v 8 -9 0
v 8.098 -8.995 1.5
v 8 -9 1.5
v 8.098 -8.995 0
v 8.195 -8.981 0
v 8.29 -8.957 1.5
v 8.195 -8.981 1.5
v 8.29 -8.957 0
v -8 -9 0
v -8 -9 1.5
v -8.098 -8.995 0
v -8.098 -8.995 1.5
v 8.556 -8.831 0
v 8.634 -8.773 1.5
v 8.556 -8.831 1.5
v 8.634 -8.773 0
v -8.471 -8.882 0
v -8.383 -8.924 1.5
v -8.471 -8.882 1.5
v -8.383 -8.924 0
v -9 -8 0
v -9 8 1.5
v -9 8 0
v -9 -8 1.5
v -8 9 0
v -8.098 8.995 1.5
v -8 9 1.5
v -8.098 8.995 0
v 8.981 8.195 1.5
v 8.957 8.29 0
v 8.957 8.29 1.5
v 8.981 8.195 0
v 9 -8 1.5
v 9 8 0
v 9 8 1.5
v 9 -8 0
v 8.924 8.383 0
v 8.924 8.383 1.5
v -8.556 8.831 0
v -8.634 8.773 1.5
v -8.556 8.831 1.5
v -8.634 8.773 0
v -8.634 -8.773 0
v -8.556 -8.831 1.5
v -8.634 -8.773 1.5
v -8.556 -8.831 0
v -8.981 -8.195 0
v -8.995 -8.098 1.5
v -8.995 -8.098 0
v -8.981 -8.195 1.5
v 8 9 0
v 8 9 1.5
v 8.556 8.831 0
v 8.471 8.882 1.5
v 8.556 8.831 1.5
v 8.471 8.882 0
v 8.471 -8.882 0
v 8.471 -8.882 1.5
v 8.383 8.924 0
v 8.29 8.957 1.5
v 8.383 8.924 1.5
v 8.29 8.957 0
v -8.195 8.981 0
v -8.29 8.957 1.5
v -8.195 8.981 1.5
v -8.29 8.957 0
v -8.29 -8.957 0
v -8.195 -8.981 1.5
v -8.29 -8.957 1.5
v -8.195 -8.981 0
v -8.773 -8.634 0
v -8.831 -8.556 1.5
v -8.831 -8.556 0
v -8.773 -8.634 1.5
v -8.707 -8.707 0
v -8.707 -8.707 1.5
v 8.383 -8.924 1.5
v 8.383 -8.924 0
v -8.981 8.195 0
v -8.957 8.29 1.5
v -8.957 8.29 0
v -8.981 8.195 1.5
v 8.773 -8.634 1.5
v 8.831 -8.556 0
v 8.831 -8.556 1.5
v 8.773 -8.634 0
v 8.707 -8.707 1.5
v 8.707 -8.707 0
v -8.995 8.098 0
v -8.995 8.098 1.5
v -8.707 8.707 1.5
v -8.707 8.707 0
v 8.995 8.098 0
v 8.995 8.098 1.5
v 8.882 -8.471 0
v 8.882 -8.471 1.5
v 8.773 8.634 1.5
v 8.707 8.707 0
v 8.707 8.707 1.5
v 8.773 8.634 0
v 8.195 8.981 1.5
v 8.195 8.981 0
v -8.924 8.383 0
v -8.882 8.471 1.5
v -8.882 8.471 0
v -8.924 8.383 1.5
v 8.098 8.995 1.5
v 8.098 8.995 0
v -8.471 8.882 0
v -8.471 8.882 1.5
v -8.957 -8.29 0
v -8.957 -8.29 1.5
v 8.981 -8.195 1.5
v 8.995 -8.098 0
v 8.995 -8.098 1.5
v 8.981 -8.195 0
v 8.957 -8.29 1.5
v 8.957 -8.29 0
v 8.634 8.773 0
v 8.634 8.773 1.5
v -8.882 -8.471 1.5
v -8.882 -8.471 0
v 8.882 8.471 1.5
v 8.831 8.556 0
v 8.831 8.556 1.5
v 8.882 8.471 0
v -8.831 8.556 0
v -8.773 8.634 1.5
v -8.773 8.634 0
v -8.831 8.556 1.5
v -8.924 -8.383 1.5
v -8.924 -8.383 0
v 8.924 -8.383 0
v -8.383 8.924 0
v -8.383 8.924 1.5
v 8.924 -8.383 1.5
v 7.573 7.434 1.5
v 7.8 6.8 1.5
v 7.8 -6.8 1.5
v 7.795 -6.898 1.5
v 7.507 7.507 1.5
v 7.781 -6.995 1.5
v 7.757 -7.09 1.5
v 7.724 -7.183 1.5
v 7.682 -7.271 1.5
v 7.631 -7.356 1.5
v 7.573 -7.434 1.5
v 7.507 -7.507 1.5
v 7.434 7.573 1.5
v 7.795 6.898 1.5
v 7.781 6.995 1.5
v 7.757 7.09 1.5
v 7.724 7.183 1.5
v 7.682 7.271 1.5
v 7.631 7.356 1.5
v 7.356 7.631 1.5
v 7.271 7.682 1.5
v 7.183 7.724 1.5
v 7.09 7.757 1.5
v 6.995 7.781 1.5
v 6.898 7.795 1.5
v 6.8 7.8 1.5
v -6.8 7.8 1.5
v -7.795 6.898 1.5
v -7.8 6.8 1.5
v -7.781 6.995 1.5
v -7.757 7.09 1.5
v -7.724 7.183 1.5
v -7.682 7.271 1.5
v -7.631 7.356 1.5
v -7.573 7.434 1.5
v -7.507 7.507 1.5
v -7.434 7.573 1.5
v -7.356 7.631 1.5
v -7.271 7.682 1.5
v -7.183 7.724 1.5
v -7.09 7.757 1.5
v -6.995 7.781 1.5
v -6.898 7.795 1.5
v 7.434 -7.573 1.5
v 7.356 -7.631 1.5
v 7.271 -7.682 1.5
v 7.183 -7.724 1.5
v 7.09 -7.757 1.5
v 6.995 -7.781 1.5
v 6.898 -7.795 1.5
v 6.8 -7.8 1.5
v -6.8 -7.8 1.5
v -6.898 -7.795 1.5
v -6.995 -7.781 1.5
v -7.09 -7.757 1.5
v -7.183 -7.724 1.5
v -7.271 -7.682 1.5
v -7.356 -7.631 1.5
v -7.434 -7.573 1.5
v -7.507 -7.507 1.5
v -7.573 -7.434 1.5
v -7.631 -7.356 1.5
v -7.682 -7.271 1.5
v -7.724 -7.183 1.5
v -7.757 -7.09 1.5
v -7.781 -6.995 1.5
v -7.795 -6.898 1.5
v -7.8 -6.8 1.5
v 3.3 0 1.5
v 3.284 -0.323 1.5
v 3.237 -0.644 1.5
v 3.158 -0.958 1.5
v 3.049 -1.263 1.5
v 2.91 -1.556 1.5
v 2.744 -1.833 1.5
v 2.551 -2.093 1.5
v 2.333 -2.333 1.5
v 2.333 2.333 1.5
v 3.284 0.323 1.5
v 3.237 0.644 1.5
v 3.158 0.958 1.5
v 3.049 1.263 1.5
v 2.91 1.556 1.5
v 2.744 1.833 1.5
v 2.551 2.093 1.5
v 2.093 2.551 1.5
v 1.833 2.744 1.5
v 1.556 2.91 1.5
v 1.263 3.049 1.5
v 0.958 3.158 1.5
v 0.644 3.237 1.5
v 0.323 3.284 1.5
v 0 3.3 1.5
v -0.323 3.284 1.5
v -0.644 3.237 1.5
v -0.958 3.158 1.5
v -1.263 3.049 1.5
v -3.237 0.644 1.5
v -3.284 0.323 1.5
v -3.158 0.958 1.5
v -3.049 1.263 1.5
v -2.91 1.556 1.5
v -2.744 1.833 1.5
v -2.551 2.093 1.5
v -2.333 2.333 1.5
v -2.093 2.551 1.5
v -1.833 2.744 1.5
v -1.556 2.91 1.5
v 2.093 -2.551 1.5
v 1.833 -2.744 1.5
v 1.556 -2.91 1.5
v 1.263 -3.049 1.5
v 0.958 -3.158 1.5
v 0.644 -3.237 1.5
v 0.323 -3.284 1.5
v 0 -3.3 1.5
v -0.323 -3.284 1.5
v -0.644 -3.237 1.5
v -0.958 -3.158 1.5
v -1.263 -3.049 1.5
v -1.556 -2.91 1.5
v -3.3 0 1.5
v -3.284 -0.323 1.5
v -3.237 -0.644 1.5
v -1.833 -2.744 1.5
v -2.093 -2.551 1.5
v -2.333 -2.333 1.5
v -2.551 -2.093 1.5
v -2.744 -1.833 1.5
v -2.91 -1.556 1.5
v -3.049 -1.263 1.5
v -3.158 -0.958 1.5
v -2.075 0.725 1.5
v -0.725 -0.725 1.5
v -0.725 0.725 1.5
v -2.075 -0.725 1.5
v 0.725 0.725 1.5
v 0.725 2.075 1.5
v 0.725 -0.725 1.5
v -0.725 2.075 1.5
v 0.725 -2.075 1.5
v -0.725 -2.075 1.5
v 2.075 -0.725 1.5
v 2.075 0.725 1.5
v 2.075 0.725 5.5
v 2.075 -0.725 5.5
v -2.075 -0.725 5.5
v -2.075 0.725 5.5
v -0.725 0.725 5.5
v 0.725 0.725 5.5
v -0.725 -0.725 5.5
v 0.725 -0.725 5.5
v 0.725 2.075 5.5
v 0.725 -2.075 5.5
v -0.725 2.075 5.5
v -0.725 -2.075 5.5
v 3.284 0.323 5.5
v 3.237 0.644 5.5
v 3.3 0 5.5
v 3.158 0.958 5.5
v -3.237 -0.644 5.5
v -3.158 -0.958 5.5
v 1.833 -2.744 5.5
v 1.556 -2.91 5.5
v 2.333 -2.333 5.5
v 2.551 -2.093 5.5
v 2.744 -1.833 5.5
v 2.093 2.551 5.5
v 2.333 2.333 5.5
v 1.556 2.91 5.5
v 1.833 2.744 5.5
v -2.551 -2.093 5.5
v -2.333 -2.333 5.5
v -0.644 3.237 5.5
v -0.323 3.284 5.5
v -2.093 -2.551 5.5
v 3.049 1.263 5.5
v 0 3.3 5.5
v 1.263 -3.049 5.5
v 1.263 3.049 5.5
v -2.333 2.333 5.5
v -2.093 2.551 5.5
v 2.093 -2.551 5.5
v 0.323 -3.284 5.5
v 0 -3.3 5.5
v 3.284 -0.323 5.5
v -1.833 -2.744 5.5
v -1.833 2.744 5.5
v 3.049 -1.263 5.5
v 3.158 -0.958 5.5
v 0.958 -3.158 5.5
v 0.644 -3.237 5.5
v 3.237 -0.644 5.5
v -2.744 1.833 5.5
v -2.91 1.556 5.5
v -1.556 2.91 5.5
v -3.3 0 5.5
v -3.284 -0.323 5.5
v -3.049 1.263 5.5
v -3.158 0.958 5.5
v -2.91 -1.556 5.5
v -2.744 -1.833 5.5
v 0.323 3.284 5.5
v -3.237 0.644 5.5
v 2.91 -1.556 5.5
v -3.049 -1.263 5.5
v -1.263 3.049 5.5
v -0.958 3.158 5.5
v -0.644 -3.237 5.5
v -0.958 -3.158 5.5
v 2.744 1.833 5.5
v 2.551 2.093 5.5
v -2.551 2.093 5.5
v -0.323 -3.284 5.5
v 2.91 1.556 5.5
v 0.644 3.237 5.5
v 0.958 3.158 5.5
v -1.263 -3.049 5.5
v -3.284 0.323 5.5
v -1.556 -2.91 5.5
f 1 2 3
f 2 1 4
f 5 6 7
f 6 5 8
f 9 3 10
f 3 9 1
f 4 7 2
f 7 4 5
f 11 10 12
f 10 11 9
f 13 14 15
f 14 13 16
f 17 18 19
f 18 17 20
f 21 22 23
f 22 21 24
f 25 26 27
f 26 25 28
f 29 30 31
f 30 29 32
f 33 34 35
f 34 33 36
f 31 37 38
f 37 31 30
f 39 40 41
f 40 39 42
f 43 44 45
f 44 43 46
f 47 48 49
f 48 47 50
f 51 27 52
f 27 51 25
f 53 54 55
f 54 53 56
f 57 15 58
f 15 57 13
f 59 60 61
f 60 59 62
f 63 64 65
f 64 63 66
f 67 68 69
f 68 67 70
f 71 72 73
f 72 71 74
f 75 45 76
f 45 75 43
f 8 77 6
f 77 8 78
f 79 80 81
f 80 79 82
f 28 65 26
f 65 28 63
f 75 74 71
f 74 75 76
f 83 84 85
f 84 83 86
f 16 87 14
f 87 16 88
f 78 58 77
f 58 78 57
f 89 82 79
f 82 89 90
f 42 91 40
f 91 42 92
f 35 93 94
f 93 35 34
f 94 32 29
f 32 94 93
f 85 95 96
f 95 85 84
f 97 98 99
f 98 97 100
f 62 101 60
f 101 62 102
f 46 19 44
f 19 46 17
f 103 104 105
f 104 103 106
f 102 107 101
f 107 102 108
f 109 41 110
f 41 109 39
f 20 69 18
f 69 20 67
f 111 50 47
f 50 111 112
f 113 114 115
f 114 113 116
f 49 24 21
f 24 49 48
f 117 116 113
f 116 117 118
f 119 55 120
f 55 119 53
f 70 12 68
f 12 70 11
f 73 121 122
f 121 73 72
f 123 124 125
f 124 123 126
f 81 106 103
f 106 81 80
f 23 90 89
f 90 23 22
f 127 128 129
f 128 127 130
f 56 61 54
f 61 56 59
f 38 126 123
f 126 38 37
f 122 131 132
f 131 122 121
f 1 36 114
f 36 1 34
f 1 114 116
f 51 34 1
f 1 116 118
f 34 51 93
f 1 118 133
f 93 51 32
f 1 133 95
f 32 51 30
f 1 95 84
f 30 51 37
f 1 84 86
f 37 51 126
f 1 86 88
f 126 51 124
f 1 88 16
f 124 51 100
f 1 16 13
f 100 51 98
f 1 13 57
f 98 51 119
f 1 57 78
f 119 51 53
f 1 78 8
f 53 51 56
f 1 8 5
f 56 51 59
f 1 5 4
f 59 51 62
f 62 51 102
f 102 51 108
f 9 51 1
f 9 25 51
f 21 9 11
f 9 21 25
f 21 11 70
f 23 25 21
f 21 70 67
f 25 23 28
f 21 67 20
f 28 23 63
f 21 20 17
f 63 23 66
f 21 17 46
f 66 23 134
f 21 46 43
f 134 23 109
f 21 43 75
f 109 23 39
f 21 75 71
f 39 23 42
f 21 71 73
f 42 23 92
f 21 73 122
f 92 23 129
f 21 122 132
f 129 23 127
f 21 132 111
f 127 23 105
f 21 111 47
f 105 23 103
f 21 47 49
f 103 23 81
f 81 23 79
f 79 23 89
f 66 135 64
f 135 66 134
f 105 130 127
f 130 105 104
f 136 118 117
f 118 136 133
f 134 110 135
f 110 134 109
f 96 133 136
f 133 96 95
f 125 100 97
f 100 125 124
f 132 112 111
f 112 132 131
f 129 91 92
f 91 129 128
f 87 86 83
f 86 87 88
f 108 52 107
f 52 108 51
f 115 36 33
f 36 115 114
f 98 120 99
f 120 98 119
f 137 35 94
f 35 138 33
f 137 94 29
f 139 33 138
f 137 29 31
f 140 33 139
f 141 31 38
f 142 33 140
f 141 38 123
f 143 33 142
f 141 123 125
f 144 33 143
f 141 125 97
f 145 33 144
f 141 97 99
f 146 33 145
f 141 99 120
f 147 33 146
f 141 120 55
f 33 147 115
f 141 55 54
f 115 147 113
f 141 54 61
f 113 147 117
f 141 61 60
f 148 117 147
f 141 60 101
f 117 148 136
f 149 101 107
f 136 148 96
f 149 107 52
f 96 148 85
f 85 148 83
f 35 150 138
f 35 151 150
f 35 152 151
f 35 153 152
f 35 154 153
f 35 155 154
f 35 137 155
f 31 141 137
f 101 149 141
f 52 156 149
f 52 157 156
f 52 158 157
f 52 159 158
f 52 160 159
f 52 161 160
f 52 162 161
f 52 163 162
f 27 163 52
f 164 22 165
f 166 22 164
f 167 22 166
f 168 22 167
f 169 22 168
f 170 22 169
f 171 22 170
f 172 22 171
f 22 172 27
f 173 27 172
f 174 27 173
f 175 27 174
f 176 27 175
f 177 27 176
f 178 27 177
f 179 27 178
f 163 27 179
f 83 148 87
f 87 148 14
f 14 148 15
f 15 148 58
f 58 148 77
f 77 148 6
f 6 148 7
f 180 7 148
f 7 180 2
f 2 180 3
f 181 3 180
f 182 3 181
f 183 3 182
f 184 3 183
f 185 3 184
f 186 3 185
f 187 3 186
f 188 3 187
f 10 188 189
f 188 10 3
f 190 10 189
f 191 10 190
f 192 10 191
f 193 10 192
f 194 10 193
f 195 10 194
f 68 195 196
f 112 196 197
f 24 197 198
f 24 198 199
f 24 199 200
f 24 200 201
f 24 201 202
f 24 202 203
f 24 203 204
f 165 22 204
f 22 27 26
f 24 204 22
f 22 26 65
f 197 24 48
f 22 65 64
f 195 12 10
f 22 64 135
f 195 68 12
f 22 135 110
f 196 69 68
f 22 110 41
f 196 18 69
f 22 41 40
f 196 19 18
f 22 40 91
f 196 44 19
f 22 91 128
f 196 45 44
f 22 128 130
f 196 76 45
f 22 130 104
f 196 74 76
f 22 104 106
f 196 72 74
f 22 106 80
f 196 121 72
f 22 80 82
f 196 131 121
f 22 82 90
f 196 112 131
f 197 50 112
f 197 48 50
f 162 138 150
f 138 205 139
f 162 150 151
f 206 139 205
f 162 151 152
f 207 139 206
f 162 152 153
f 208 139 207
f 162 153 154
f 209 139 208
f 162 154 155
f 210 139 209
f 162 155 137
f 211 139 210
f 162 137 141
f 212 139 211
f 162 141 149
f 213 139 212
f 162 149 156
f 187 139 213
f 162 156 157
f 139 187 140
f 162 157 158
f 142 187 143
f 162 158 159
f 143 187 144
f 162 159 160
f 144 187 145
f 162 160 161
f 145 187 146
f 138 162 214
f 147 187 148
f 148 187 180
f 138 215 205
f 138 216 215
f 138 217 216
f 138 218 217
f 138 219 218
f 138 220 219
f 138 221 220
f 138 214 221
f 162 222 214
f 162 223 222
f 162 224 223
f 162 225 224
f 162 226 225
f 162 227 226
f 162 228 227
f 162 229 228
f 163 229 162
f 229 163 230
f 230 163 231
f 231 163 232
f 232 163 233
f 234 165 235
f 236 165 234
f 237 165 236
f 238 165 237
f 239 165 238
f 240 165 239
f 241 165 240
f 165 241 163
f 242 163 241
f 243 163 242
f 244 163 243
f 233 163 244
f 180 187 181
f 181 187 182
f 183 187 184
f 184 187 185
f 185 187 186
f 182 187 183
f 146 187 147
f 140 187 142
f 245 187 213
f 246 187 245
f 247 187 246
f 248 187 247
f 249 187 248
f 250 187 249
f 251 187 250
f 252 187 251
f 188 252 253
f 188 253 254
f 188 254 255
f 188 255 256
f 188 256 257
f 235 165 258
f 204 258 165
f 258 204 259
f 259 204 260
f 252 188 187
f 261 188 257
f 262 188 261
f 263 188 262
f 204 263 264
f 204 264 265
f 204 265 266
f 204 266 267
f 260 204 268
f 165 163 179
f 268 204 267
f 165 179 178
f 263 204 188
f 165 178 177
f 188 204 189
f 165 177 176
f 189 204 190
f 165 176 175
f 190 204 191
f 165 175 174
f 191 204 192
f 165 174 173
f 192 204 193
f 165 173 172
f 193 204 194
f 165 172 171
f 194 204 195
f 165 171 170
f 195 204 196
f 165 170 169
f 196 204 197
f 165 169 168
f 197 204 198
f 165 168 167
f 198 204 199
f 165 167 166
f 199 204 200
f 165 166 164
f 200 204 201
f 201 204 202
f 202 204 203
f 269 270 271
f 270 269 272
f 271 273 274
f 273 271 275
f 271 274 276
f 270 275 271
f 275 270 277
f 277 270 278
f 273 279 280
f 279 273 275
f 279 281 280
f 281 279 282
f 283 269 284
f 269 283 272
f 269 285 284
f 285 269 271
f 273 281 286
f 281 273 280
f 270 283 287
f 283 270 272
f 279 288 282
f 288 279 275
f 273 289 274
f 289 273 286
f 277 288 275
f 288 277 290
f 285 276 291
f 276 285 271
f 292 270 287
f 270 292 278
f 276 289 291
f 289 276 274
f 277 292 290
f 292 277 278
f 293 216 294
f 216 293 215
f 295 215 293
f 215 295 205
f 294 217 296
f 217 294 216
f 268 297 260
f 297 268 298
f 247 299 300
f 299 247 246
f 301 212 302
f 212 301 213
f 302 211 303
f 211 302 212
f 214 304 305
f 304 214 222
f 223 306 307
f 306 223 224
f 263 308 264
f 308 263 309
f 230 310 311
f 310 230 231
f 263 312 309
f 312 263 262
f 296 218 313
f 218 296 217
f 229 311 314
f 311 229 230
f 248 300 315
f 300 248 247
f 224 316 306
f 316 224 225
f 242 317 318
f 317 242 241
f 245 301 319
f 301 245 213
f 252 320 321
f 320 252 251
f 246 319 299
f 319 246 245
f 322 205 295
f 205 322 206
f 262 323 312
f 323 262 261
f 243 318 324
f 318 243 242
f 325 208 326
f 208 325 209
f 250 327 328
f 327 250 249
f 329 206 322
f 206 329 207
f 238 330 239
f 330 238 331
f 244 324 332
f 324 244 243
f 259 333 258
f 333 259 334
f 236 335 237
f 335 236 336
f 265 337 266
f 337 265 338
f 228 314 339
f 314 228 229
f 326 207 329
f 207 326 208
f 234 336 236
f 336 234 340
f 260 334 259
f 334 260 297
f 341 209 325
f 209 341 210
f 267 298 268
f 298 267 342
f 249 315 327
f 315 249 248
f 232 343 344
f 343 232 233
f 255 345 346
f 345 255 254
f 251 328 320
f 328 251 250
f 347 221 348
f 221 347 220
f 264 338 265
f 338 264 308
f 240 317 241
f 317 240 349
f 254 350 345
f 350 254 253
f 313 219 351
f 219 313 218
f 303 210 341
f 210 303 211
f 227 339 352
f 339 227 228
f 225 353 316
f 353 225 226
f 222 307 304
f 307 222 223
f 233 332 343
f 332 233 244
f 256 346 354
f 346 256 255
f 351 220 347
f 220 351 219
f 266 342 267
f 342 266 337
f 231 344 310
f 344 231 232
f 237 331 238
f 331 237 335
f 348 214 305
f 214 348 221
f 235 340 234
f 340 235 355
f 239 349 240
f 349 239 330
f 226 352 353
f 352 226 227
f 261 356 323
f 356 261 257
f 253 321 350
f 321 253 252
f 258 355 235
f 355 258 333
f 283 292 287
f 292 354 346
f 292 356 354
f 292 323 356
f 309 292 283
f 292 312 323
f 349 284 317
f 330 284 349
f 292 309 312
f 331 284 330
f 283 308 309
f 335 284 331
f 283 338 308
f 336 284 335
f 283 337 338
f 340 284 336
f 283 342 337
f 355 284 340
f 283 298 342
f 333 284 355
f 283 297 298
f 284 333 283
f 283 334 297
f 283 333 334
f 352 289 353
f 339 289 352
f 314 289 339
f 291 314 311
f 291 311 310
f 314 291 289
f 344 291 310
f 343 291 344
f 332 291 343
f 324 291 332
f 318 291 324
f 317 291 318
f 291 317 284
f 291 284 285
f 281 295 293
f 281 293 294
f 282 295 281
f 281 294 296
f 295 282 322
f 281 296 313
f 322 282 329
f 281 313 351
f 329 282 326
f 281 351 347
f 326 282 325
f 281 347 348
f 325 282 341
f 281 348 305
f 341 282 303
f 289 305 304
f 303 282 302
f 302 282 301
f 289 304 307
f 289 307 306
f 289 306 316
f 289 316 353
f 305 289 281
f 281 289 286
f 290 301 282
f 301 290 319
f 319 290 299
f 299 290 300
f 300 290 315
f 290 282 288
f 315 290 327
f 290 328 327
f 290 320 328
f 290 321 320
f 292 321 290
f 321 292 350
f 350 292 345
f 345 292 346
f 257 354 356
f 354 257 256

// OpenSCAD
///////////////////////////////////////////////////////////
// PARAMETRIC FLAT CHERRY MX KEYCAP
// Stable dimensions, no Minkowski scaling
///////////////////////////////////////////////////////////

// ------------------ Shape ------------------
corner_radius = 1;
wall_thickness = 1.2;
top_thickness  = 1.5;

// ------------------ Key size ------------------
key_width  = 1 * 18;    // 1u = 18 mm
key_depth  = 1 * 18;
key_height = top_thickness + 0;

// ------------------ Cherry MX stem ------------------
stem_height   = top_thickness + 4;
stem_outer_d  = 6.6;   // outer boss
stem_arm      = 4;   // cross length
stem_thick    = 1.3;   // cross thickness
stem_gap      = 0.15;  // fit tolerance

// ------------------ Quality ------------------
$fn = 64;


// ===================== MAIN =====================
union() {
    keycap_body();
    stem_female();
}


// ===================== BODY =====================
module keycap_body() {
    difference() {
        outer_shell();
        inner_hollow();
    }
}

module outer_shell() {
    linear_extrude(height = key_height)
        rounded_rect(key_width, key_depth, corner_radius);
}

module inner_hollow() {
    translate([0, 0, top_thickness])
        linear_extrude(height = key_height)
            rounded_rect(
                key_width  - 2*wall_thickness,
                key_depth  - 2*wall_thickness,
                corner_radius
            );
}


// ===================== STEM =====================
module stem_female() {
    translate([0, 0, stem_height/2])
    difference() {
        // Outer stem boss (POSITIVE)
        cylinder(
            h = stem_height,
            d = stem_outer_d,
            center = true
        );

        // Cherry MX cross (NEGATIVE)
        union() {
            cube([
                stem_arm + stem_gap,
                stem_thick + stem_gap,
                stem_height + 0.2
            ], center=true);

            cube([
                stem_thick + stem_gap,
                stem_arm + stem_gap,
                stem_height + 0.2
            ], center=true);
        }
    }
}


// ===================== 2D HELPERS =====================
module rounded_rect(w, d, r) {
    offset(r = r)
        square([w - 2*r, d - 2*r], center=true);
}
